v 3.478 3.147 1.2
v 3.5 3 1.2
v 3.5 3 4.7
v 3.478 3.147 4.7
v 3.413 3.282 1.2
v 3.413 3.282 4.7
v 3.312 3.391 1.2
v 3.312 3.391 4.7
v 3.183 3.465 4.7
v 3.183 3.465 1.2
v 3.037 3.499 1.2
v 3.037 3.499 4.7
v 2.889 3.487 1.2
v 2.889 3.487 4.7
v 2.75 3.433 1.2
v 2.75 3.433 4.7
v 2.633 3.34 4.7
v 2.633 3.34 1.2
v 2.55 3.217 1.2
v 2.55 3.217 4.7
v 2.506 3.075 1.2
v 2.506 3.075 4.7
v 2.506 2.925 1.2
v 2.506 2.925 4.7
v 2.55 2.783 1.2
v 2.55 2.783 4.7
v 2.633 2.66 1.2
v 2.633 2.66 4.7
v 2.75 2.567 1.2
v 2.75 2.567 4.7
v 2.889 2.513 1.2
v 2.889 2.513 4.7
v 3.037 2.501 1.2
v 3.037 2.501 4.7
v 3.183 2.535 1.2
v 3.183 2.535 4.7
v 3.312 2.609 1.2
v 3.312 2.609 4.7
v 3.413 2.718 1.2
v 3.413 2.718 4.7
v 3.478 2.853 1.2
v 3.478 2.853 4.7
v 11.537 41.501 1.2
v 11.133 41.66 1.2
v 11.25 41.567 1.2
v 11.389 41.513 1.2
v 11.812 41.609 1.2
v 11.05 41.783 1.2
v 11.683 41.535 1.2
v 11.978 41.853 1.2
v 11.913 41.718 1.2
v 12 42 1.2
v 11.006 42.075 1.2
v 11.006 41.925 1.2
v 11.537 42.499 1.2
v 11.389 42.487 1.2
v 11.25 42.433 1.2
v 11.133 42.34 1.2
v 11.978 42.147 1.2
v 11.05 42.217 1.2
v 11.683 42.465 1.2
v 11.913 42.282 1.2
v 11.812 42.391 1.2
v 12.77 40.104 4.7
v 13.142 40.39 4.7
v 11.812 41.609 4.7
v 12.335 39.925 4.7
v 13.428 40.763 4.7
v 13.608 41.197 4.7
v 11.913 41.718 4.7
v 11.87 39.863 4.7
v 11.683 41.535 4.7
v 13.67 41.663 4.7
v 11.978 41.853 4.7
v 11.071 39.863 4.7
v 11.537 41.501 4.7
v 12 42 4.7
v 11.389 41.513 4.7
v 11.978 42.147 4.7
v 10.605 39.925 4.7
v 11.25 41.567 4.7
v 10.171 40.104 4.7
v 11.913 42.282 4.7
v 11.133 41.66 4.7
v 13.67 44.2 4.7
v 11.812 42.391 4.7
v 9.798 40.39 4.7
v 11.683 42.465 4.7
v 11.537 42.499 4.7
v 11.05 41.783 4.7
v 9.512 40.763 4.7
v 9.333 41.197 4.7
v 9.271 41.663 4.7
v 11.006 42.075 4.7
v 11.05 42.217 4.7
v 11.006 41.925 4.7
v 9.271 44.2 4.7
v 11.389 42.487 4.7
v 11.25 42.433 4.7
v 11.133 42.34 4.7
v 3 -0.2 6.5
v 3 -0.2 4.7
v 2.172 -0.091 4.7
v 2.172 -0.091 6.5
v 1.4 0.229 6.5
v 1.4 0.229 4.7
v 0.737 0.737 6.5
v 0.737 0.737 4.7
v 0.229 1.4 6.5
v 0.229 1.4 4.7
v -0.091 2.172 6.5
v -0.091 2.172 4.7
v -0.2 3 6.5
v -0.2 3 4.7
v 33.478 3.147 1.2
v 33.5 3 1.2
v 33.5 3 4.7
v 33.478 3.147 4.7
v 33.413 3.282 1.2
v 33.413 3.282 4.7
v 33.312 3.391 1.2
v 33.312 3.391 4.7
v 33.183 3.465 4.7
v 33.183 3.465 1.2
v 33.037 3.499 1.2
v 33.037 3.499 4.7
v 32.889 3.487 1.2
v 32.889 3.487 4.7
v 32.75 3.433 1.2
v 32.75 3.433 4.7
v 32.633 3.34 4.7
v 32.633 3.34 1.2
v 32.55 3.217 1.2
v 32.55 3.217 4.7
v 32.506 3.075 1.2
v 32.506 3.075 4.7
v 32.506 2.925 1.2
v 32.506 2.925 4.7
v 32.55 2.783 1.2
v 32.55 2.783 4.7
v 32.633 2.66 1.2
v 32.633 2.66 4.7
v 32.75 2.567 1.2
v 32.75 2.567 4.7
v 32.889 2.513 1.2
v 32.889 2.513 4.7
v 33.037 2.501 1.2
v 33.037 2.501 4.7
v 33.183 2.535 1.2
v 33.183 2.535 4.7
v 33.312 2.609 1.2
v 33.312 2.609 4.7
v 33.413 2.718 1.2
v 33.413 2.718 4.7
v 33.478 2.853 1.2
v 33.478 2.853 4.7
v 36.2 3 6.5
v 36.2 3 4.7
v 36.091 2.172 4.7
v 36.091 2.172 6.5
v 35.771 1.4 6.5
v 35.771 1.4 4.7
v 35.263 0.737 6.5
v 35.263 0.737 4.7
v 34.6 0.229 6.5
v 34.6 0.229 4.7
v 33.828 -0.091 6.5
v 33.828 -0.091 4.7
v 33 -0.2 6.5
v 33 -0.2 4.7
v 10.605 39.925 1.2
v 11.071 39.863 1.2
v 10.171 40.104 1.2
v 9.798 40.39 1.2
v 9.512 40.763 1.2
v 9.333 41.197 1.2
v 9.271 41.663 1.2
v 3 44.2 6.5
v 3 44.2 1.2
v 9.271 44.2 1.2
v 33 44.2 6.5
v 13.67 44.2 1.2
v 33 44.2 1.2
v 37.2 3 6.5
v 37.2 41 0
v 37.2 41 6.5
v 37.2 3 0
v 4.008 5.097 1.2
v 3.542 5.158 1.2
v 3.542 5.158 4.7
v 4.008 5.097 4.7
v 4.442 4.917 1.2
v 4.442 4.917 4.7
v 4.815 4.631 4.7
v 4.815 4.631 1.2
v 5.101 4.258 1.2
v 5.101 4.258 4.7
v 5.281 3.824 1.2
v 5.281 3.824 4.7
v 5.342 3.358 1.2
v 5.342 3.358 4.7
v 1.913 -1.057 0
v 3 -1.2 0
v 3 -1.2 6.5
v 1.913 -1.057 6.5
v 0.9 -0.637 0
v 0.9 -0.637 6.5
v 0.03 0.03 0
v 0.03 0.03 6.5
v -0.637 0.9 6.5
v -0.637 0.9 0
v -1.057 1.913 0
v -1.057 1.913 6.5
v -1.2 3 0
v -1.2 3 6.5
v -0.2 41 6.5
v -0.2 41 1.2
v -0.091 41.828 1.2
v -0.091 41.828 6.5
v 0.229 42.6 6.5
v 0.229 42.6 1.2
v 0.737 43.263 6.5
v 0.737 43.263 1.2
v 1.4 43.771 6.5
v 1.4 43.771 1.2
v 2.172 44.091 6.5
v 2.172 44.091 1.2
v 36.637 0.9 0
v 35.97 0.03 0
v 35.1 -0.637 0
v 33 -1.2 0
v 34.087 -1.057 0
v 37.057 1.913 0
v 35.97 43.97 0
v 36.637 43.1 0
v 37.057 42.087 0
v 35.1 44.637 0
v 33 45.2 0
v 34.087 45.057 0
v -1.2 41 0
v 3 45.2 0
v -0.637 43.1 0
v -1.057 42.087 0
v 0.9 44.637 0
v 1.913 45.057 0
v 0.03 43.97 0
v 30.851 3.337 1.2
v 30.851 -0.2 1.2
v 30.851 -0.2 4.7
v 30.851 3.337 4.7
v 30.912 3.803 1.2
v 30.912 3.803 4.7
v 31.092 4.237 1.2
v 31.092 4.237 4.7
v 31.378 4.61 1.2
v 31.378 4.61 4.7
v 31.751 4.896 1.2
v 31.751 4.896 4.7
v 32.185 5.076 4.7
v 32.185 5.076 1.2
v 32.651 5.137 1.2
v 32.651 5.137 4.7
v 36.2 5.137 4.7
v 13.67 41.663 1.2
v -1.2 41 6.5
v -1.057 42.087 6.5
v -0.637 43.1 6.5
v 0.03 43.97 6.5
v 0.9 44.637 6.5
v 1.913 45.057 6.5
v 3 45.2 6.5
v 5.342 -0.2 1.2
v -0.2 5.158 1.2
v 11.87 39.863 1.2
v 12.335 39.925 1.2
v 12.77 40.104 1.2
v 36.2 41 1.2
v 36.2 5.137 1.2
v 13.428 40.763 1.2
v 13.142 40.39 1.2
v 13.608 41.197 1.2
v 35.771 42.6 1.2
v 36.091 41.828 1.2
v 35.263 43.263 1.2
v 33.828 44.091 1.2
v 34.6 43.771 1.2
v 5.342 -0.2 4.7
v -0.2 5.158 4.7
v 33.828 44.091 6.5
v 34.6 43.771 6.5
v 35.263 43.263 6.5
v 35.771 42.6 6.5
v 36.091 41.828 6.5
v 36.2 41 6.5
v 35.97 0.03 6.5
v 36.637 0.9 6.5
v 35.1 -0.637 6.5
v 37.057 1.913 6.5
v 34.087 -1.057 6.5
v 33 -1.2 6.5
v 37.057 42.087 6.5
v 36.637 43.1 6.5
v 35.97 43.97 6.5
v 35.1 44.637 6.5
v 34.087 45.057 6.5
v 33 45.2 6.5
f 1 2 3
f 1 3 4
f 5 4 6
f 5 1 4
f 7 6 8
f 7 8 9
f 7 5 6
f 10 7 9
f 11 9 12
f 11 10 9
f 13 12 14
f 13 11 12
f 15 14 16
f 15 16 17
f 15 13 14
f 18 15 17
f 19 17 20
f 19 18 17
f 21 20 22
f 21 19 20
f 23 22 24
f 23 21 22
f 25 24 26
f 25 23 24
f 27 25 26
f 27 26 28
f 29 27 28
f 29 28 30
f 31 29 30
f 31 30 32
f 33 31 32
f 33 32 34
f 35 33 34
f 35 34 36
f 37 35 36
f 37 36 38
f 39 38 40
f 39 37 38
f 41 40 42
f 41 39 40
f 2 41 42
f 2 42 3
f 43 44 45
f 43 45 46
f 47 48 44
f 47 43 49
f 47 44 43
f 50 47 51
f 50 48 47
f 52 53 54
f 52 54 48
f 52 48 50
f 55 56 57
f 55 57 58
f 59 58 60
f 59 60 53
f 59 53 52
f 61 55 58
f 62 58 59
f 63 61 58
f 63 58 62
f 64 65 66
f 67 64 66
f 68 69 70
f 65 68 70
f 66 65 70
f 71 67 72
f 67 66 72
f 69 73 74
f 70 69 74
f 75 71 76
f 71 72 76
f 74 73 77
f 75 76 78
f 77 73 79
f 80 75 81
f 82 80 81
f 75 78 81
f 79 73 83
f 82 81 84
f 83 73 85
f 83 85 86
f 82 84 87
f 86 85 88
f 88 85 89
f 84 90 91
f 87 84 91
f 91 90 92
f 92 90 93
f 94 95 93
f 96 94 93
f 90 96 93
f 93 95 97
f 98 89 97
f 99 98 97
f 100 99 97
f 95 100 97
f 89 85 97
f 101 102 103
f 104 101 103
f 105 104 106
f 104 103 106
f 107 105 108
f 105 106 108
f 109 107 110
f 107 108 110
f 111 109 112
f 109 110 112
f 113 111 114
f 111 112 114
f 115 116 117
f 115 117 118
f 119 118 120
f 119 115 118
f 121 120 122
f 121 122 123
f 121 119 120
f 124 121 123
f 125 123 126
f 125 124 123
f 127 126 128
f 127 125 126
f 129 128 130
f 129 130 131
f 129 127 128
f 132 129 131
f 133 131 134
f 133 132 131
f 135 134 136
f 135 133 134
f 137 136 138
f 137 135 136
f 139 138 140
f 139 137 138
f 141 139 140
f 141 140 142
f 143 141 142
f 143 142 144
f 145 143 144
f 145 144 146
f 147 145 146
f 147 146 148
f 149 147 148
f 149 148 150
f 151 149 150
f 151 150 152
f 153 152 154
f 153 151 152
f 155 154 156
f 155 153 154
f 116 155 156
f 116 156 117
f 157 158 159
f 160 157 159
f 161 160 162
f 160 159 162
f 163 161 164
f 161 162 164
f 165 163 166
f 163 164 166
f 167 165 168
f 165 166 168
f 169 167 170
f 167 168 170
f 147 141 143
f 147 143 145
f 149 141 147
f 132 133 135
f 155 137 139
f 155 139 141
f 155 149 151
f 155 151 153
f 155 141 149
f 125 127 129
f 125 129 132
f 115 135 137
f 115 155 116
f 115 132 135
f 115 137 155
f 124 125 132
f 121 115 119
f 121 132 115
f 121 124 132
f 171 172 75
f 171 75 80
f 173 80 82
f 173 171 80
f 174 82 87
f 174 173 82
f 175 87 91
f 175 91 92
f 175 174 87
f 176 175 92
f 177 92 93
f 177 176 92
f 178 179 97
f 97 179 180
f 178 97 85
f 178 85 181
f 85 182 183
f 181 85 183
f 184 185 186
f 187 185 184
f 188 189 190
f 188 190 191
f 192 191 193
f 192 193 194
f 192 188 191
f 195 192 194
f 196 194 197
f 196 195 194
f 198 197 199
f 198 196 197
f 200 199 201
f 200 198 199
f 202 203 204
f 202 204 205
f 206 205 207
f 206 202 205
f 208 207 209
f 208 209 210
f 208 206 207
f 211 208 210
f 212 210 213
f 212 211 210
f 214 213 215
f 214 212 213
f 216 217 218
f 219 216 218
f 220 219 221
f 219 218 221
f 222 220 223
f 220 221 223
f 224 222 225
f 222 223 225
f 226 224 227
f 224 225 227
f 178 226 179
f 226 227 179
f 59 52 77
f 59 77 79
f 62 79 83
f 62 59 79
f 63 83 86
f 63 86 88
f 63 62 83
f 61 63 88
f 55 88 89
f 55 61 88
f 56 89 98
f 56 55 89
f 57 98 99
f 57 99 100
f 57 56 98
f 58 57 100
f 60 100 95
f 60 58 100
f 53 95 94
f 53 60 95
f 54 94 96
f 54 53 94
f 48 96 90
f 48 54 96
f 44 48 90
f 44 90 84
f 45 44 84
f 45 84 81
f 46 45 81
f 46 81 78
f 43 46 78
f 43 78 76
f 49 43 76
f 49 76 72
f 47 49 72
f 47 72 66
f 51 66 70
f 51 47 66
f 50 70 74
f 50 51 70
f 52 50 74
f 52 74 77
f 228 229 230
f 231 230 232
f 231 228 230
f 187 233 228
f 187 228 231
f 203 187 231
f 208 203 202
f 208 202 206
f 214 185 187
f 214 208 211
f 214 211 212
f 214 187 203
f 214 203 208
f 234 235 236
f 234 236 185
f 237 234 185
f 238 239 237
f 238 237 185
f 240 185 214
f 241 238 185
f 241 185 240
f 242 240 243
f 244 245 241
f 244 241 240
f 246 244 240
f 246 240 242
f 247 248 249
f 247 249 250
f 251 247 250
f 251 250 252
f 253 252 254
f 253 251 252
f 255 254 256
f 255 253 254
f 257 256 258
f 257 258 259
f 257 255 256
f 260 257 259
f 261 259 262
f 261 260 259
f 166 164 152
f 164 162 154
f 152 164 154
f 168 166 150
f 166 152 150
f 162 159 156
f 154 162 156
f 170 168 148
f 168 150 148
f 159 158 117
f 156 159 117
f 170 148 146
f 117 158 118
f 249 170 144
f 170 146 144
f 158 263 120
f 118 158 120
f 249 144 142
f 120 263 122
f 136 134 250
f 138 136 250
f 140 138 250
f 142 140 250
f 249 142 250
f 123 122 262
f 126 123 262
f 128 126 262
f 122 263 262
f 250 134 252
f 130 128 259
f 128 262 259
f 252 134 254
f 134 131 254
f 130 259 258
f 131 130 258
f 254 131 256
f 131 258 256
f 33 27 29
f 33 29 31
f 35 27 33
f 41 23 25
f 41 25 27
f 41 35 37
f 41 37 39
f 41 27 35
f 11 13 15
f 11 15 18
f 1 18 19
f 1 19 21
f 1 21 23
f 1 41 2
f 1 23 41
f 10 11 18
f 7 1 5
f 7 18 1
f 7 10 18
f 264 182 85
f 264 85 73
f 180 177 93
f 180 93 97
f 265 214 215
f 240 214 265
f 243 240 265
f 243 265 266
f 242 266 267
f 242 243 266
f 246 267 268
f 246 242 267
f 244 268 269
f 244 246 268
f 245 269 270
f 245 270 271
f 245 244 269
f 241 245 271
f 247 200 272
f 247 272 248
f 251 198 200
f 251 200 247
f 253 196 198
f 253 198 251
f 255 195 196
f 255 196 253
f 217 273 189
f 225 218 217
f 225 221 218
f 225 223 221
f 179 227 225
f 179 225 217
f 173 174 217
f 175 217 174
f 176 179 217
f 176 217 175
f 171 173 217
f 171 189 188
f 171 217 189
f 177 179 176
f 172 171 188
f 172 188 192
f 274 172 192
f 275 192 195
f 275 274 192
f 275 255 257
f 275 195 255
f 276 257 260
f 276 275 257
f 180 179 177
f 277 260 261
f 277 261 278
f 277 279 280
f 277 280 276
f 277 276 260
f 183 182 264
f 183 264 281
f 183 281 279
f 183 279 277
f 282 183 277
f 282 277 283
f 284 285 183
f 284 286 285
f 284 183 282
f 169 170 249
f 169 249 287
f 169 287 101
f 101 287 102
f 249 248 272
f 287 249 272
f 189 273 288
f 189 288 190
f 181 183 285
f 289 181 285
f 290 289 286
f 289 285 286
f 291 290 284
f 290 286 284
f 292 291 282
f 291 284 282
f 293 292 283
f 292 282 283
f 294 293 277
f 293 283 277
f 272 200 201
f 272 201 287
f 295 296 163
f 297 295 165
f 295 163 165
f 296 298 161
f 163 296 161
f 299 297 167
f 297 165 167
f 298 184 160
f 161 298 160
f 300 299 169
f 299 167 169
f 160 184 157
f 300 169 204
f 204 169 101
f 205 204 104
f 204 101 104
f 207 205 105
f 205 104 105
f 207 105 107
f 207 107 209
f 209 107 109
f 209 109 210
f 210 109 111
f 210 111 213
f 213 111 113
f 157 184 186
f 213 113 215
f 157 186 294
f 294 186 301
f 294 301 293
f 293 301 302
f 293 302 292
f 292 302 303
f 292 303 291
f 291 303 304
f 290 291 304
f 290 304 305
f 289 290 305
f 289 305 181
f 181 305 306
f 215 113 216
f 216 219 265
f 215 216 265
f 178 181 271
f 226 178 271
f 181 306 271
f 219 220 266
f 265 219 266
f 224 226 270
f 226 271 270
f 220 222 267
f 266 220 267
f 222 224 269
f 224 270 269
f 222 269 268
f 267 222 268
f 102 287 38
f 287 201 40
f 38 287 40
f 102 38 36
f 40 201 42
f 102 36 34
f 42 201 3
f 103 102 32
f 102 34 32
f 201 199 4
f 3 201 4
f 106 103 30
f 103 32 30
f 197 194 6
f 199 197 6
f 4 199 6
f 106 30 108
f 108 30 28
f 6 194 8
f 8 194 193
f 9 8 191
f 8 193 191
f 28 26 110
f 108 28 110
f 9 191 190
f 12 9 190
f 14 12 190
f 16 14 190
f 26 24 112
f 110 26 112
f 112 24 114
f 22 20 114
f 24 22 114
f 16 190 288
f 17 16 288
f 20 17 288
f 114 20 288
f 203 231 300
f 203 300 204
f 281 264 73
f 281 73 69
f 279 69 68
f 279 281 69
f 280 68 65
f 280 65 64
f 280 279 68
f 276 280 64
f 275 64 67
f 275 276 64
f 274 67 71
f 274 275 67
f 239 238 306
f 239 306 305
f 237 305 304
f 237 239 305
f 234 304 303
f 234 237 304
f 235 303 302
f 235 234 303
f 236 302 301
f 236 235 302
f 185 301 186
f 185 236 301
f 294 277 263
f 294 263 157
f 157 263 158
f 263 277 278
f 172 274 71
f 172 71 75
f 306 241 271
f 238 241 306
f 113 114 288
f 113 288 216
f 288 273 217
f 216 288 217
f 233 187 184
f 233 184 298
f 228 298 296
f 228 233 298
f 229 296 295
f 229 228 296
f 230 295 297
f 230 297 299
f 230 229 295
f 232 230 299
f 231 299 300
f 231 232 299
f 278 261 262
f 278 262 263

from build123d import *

# Parameters (mm, degrees)
EXTRUDE_1_DEPTH = 6.5
EXTRUDE_2_DEPTH = 1.2
SKETCH_4_R      = 0.5
EXTRUDE_3_DEPTH = 3.5


with BuildPart() as part:
    # Эскиз2 → Бобышка-Вытянуть1 (new body)
    with BuildSketch(Plane.XY):
        with BuildLine():
            Line((3.000001789, 45.2000009), (33.00000004, 45.2000009))
            ThreePointArc((33.00000004, 45.2000009), (35.969850924, 43.969847649), (37.20000166, 40.999995724))
            Line((37.20000166, 40.999995724), (37.20000166, 3.000004329))
            ThreePointArc((37.20000166, 3.000004329), (35.969850624, 0.030152951), (33.00000004, -1.2))
            Line((33.00000004, -1.2), (3.000001789, -1.2))
            ThreePointArc((3.000001789, -1.2), (0.030149154, 0.030152293), (-1.20000254, 3.000005176))
            Line((-1.20000254, 3.000005176), (-1.20000254, 40.999996571))
            ThreePointArc((-1.20000254, 40.999996571), (0.030149454, 43.969848906), (3.000001789, 45.2000009))
        make_face()
        with BuildLine():
            Line((3.000001789, 44.2000009), (33.00000004, 44.2000009))
            ThreePointArc((33.00000004, 44.2000009), (35.262743843, 43.262741167), (36.20000166, 40.999996571))
            Line((36.20000166, 40.999996571), (36.20000166, 3.000004329))
            ThreePointArc((36.20000166, 3.000004329), (35.262743843, 0.737259733), (33.00000004, -0.2))
            Line((33.00000004, -0.2), (3.000001789, -0.2))
            ThreePointArc((3.000001789, -0.2), (0.737256235, 0.737258775), (-0.20000254, 3.000004329))
            Line((-0.20000254, 3.000004329), (-0.20000254, 40.999996571))
            ThreePointArc((-0.20000254, 40.999996571), (0.737256235, 43.262742125), (3.000001789, 44.2000009))
        make_face(mode=Mode.SUBTRACT)
    extrude(amount=EXTRUDE_1_DEPTH)

    # Эскиз3 → Бобышка-Вытянуть2 (add)
    with BuildSketch(Plane.XY):
        with BuildLine():
            Line((-1.20000254, 40.999996571), (-1.20000254, 3.000005176))
            ThreePointArc((-1.20000254, 3.000005176), (0.030149154, 0.030152293), (3.000001789, -1.2))
            Line((3.000001789, -1.2), (33.00000004, -1.2))
            ThreePointArc((33.00000004, -1.2), (35.969850624, 0.030152951), (37.20000166, 3.000004329))
            Line((37.20000166, 3.000004329), (37.20000166, 40.999995724))
            ThreePointArc((37.20000166, 40.999995724), (35.969850924, 43.969847649), (33.00000004, 45.2000009))
            Line((33.00000004, 45.2000009), (3.000001789, 45.2000009))
            ThreePointArc((3.000001789, 45.2000009), (0.030149454, 43.969848906), (-1.20000254, 40.999996571))
        make_face()
    extrude(amount=EXTRUDE_2_DEPTH)

    # Эскиз4 → Бобышка-Вытянуть3 (add)
    # profile 1 of 3: a face of its own
    with BuildSketch(Plane.XY.offset(1.2)):
        with BuildLine():
            Line((9.271219031, 44.2000009), (13.669603576, 44.2000009))
            Line((13.669603576, 44.2000009), (13.669603576, 41.66326091))
            ThreePointArc((13.669603576, 41.66326091), (13.142395782, 40.390468704), (11.869603576, 39.86326091))
            Line((11.869603576, 39.86326091), (11.071219031, 39.86326091))
            ThreePointArc((11.071219031, 39.86326091), (9.798426825, 40.390468704), (9.271219031, 41.66326091))
            Line((9.271219031, 41.66326091), (9.271219031, 44.2000009))
        make_face()
        with Locations((11.49999986, 41.99999982)):
            Circle(SKETCH_4_R, mode=Mode.SUBTRACT)
    # profile 2 of 3: a face of its own
    with BuildSketch(Plane.XY.offset(1.2)):
        with BuildLine():
            Line((-0.20000254, 3.000004329), (-0.20000254, 5.158126066))
            Line((-0.20000254, 5.158126066), (3.542071928, 5.158126066))
            ThreePointArc((3.542071928, 5.158126066), (4.814864134, 4.630918272), (5.342071928, 3.358126066))
            Line((5.342071928, 3.358126066), (5.342071928, -0.2))
            Line((5.342071928, -0.2), (3.000001789, -0.2))
            ThreePointArc((3.000001789, -0.2), (0.737256235, 0.737258775), (-0.20000254, 3.000004329))
        make_face()
        with Locations((2.99999908, 3.00000162)):
            Circle(SKETCH_4_R, mode=Mode.SUBTRACT)
    # profile 3 of 3: a face of its own
    with BuildSketch(Plane.XY.offset(1.2)):
        with BuildLine():
            Line((33.00000004, -0.2), (30.851118491, -0.2))
            Line((30.851118491, -0.2), (30.851118491, 3.337368367))
            ThreePointArc((30.851118491, 3.337368367), (31.378326285, 4.610160574), (32.651118491, 5.137368367))
            Line((32.651118491, 5.137368367), (36.20000166, 5.137368367))
            Line((36.20000166, 5.137368367), (36.20000166, 3.000004329))
            ThreePointArc((36.20000166, 3.000004329), (35.262743843, 0.737259733), (33.00000004, -0.2))
        make_face()
        with Locations((33.00000004, 3.00000162)):
            Circle(SKETCH_4_R, mode=Mode.SUBTRACT)
    extrude(amount=EXTRUDE_3_DEPTH)


solid = part.part
